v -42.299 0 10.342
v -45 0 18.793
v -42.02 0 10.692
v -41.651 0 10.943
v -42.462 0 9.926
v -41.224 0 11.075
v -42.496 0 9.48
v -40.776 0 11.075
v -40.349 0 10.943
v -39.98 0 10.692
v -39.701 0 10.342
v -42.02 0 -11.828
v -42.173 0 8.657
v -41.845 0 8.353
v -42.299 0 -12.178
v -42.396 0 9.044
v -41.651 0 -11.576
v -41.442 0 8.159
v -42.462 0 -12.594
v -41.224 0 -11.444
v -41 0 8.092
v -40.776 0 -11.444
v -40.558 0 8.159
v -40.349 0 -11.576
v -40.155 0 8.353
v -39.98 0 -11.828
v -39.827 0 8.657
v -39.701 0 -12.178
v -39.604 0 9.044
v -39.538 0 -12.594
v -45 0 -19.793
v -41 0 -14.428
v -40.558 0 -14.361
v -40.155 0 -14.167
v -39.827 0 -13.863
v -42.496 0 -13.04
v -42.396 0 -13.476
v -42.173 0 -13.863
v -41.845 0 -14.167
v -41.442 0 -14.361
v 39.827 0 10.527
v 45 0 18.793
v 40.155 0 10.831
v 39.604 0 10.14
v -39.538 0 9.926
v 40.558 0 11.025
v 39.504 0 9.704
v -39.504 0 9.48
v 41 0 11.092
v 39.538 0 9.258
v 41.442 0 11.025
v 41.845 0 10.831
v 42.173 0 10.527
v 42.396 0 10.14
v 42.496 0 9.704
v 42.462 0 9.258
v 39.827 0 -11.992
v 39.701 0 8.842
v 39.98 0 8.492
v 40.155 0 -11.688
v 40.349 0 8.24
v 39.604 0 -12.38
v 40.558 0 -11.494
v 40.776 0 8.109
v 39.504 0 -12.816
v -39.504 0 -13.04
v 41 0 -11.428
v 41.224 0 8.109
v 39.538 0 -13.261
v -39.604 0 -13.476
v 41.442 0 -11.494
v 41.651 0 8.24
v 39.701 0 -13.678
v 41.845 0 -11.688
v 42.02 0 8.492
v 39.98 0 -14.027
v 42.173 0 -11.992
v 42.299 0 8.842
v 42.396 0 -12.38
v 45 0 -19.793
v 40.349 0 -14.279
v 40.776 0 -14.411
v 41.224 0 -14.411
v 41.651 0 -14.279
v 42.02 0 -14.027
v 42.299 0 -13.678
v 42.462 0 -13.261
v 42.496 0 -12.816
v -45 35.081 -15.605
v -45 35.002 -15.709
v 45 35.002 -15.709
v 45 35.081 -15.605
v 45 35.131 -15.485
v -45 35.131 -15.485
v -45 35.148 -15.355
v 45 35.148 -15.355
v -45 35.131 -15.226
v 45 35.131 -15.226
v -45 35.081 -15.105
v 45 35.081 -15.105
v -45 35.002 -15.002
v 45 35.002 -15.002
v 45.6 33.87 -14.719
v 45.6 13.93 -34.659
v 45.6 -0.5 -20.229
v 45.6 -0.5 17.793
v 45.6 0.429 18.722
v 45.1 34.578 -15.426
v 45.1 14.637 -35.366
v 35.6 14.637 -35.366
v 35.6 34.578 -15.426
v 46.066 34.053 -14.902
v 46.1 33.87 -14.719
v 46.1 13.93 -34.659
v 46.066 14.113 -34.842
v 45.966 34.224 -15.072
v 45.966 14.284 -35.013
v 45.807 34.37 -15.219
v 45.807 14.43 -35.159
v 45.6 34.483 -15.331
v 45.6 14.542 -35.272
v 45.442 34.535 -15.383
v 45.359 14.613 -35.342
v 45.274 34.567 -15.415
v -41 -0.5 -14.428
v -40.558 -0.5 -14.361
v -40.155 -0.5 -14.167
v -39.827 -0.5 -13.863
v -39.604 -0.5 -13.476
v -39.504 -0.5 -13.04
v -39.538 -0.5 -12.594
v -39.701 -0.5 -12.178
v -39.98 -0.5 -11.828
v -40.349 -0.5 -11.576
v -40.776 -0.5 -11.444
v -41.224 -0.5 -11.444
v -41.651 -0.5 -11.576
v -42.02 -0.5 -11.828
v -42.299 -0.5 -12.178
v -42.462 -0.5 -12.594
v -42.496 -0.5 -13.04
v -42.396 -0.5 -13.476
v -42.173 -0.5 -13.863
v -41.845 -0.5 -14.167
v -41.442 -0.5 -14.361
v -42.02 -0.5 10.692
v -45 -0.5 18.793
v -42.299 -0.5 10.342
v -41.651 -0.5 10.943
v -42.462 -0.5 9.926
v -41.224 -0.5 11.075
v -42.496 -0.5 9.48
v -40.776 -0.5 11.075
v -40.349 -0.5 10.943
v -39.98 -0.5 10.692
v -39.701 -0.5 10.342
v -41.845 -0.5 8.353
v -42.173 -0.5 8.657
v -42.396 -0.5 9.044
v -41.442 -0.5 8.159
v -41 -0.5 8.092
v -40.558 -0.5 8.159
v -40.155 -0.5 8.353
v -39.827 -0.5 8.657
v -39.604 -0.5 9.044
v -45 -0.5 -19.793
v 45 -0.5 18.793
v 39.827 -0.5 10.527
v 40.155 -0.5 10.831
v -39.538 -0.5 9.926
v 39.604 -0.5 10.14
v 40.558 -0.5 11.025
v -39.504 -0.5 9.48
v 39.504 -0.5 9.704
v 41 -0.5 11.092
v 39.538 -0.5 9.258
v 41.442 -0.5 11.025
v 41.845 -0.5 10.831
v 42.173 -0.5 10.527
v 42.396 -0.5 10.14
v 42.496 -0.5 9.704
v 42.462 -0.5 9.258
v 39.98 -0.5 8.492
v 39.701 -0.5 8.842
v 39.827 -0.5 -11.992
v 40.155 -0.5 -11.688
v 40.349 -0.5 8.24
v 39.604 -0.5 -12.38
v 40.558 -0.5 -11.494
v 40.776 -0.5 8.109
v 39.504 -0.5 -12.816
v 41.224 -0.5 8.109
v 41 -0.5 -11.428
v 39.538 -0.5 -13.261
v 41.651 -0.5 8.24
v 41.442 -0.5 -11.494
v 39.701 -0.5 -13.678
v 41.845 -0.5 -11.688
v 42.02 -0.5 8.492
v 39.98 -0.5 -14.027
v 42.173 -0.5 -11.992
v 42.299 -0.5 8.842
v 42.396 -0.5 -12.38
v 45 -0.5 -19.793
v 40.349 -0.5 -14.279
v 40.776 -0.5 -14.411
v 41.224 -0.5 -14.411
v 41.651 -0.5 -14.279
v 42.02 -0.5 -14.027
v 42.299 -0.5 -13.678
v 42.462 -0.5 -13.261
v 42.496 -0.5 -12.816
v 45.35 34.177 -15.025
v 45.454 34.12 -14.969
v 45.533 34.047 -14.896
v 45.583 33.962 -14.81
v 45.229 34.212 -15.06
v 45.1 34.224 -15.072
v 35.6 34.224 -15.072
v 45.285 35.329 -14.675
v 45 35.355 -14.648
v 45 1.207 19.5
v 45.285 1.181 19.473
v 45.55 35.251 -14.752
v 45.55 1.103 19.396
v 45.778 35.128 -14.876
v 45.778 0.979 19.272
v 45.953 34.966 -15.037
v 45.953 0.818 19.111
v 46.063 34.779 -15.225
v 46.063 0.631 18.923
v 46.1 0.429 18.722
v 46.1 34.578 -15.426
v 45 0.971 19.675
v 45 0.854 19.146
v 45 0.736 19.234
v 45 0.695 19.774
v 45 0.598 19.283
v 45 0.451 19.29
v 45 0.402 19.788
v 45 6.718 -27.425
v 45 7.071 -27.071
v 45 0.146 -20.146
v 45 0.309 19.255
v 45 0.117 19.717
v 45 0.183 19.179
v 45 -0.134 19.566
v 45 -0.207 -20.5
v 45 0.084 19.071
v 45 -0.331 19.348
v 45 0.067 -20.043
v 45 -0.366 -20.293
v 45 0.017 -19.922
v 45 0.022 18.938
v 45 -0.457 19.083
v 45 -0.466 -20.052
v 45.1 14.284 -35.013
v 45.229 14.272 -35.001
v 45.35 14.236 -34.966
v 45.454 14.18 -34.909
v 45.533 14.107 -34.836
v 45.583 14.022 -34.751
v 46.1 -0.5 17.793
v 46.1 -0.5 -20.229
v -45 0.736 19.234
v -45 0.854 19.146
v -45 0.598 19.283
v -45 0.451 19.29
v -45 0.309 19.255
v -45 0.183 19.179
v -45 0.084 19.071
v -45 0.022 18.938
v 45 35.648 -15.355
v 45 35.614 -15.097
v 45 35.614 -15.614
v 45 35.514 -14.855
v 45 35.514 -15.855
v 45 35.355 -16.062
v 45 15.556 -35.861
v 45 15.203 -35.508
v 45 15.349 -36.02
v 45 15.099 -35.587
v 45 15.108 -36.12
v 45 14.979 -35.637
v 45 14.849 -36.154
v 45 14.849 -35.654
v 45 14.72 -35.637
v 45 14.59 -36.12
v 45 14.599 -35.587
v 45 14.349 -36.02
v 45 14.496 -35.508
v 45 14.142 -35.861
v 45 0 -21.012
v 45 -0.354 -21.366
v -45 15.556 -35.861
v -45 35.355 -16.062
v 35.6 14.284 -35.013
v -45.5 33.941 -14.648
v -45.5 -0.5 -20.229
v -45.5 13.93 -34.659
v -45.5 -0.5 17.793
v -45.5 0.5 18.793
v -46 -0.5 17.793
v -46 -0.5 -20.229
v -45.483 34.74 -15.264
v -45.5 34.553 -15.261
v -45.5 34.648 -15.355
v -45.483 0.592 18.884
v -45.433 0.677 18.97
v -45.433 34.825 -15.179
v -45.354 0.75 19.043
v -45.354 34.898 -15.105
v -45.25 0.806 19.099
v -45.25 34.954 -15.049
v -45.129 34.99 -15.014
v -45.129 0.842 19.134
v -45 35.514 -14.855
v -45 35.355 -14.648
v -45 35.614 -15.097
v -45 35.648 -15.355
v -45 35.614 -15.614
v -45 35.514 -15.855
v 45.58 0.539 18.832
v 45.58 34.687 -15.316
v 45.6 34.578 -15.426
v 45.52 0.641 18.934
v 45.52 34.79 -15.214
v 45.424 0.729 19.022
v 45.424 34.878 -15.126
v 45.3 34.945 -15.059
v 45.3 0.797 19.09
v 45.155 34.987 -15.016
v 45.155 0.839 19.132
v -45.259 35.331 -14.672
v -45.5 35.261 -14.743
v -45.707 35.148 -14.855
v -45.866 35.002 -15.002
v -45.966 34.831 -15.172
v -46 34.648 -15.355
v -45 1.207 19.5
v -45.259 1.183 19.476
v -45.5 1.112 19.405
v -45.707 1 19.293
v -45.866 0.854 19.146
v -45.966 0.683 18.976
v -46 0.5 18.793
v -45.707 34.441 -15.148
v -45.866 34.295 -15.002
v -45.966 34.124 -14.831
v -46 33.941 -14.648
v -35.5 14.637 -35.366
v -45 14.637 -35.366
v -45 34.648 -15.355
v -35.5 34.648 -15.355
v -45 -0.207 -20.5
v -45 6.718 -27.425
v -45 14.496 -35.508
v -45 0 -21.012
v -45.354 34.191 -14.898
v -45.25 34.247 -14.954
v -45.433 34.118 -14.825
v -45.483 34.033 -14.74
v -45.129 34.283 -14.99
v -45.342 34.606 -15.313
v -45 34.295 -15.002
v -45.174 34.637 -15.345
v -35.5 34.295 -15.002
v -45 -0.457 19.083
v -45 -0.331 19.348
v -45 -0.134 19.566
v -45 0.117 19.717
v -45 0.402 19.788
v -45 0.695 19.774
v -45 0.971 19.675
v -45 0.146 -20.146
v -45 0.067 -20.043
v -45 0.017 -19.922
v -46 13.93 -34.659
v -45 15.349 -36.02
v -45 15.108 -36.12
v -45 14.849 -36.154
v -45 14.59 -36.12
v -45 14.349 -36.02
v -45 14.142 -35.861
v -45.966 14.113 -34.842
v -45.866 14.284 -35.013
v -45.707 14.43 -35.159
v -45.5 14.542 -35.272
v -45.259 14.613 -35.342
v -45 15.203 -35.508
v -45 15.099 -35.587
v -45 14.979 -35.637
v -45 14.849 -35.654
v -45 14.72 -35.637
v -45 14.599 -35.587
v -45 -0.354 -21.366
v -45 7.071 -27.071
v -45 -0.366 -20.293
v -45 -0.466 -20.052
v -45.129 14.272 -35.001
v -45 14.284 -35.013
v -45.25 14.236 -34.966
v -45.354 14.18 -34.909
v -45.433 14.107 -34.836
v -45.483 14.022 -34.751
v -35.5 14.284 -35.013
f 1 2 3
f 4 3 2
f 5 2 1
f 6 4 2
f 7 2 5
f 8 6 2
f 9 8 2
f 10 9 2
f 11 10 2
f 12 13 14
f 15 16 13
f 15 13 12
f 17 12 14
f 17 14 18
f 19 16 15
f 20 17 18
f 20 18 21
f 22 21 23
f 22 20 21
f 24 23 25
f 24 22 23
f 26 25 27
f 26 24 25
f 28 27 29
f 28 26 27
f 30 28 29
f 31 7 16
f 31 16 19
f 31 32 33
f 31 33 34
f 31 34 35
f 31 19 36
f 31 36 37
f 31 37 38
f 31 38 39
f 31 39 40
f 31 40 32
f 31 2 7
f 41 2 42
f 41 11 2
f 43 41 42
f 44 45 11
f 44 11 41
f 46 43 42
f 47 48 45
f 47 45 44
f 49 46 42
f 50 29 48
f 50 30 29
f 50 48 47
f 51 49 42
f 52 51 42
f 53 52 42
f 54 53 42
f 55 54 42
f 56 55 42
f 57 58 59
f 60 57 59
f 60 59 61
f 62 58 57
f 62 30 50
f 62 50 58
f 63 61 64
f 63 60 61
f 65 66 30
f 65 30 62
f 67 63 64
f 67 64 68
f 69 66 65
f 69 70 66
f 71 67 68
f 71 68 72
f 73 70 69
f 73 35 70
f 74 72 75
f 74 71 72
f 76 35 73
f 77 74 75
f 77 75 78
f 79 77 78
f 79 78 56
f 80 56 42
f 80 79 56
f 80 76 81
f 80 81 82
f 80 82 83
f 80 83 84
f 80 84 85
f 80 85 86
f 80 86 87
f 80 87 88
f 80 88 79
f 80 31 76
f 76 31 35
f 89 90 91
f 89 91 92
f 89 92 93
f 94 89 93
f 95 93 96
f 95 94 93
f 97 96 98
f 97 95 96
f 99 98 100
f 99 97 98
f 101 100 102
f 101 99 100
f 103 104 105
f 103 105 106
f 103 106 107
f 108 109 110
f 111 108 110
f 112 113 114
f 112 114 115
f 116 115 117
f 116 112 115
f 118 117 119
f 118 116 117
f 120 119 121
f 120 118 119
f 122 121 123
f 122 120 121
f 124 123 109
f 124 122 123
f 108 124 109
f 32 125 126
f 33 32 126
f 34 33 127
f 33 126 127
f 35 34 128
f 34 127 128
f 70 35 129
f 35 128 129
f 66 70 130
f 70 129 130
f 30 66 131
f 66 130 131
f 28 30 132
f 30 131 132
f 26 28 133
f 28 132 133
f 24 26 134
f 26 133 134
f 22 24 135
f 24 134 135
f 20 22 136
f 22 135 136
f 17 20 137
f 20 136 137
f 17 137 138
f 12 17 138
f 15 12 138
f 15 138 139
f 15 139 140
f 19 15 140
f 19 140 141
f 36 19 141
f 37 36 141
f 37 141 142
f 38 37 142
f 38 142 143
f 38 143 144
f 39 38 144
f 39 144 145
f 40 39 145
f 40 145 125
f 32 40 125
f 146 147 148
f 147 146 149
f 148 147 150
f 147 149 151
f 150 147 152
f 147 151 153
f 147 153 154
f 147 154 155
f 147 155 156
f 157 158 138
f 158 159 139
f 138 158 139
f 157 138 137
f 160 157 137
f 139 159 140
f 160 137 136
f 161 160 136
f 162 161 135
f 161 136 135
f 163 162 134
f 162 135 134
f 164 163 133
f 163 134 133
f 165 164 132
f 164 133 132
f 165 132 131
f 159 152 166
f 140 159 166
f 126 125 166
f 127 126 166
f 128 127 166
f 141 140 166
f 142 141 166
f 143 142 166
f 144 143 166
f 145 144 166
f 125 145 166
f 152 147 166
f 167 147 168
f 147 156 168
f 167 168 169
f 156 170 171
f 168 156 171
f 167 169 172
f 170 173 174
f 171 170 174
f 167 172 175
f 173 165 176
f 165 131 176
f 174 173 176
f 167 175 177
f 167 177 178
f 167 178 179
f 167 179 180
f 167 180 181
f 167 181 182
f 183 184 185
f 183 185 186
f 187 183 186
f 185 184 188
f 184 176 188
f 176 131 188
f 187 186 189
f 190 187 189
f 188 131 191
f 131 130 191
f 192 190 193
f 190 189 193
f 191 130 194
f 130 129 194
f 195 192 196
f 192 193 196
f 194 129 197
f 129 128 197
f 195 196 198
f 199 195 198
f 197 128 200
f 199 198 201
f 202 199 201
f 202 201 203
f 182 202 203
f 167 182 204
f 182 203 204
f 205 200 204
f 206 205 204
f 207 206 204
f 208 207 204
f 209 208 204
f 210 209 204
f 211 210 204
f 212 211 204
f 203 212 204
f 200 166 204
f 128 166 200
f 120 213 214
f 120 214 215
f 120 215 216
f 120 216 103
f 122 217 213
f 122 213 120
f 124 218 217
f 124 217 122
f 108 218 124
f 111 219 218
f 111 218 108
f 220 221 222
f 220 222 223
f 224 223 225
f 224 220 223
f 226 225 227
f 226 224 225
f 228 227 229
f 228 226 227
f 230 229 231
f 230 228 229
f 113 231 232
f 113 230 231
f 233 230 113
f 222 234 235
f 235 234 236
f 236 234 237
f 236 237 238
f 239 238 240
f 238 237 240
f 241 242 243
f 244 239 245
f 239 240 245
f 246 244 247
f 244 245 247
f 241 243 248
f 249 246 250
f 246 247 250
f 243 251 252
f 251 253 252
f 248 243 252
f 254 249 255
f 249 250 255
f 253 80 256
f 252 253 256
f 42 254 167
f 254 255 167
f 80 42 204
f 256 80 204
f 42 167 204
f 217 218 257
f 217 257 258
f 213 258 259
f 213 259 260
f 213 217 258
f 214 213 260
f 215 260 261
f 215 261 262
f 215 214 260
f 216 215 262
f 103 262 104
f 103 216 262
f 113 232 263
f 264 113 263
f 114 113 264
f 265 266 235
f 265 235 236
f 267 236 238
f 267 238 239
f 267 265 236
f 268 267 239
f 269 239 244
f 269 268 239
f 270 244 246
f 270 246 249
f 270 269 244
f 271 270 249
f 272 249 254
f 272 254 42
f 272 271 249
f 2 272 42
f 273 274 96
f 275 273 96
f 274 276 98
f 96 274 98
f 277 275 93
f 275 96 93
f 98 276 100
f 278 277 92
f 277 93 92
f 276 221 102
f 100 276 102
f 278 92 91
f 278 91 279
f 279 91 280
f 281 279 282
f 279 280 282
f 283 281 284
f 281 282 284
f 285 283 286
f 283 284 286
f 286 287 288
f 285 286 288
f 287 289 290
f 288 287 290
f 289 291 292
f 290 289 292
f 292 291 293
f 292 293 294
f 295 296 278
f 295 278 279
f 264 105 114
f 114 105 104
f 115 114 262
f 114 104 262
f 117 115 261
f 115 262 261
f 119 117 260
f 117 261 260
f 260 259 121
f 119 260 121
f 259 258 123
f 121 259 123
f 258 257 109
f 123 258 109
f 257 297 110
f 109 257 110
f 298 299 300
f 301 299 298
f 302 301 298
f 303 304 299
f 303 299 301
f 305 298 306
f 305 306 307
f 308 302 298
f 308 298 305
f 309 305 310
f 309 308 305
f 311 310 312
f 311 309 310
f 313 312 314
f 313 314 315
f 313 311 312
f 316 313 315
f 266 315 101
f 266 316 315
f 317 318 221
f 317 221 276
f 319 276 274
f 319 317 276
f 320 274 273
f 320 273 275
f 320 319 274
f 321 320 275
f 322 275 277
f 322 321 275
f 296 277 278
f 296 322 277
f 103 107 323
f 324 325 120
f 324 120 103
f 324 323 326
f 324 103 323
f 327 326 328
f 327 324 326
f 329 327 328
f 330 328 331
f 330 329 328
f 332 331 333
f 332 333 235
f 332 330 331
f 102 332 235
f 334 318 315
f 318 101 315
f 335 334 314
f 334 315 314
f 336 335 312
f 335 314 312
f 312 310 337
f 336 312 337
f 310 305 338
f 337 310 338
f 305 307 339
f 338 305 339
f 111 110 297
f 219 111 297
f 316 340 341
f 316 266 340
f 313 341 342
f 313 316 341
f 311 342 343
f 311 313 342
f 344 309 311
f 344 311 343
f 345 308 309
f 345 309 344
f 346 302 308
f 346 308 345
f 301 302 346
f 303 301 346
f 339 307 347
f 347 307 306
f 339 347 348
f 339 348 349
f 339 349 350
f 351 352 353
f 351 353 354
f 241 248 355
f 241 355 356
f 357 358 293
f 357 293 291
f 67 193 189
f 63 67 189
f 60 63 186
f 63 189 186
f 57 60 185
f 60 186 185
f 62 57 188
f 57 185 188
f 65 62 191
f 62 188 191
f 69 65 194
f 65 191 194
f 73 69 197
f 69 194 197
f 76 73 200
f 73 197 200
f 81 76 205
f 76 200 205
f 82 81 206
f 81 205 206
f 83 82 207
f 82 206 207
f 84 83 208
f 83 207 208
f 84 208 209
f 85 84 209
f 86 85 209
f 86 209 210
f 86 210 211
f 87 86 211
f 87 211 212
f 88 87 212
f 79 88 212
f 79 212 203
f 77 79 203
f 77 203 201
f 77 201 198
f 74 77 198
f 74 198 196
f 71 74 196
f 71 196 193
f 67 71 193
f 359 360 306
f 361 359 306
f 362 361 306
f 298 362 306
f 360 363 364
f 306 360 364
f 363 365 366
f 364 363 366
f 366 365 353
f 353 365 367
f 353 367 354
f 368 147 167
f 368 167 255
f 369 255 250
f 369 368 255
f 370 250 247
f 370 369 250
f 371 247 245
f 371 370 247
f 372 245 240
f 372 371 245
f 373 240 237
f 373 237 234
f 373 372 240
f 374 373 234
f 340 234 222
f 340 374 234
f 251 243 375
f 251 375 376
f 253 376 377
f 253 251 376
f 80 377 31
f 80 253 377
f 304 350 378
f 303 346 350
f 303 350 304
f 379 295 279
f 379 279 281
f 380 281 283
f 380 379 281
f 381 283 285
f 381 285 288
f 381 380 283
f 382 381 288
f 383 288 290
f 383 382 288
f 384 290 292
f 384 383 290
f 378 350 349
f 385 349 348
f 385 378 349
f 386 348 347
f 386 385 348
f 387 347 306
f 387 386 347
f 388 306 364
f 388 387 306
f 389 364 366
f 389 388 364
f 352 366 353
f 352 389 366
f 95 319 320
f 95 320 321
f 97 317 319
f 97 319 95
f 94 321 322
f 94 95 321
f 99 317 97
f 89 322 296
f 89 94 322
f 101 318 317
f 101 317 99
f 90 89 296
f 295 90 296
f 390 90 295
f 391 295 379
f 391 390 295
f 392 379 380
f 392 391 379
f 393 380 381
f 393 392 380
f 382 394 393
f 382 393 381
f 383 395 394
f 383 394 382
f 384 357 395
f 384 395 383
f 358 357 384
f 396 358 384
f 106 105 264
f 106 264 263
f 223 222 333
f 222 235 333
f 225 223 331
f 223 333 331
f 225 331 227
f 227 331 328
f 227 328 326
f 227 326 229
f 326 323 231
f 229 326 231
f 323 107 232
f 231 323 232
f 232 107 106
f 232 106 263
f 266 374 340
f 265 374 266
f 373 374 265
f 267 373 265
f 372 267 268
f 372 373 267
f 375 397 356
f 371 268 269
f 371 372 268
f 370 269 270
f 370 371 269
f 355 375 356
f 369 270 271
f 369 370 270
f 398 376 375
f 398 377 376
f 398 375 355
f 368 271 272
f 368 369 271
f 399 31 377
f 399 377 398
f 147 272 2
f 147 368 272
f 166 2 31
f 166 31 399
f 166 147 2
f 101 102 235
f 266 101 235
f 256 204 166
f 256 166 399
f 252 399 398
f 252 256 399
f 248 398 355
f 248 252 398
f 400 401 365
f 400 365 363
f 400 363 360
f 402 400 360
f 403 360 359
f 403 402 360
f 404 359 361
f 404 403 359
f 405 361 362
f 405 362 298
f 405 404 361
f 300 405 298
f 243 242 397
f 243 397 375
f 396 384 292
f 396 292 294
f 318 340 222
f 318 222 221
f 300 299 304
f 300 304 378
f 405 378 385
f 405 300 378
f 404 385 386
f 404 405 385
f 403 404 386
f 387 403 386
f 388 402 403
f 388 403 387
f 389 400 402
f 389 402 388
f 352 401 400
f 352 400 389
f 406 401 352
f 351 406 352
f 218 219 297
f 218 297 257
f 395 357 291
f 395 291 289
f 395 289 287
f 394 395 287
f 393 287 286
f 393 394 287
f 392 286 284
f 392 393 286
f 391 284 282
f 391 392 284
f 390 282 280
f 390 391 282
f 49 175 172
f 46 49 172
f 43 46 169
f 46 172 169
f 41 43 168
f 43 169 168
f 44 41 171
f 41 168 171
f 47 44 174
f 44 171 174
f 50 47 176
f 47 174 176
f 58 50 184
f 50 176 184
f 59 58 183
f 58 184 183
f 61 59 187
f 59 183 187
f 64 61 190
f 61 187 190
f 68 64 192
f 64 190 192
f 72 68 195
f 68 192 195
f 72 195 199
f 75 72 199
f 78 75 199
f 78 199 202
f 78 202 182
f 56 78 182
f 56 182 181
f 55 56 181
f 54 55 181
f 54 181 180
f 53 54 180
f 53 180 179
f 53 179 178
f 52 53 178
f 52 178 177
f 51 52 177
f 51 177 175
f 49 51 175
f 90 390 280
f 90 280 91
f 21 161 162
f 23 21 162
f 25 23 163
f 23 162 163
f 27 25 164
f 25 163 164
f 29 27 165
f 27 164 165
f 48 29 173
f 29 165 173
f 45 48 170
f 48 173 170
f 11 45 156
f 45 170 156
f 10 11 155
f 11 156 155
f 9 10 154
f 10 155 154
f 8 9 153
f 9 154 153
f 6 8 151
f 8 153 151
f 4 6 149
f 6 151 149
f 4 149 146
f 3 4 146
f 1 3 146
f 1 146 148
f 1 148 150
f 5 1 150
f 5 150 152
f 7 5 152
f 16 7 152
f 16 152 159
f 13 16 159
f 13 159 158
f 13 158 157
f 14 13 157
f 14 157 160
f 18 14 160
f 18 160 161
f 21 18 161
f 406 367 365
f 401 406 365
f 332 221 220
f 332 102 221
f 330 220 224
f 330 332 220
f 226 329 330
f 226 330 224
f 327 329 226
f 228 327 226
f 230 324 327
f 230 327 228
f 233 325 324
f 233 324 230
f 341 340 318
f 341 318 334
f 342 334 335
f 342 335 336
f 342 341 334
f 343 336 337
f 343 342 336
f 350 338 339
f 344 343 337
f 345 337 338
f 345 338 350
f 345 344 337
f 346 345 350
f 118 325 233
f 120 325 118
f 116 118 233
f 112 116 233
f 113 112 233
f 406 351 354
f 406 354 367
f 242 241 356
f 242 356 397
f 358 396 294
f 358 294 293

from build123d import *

# Parameters (mm, degrees)
SKETCH1_W                     = 90
SKETCH1_H                     = 40
BASE_FLANGE1_DEPTH            = 0.5
EDGE_FLANGE1_STRIP_CUT_DEPTH  = 90
EDGE_FLANGE1_DEPTH            = 90
EDGE_FLANGE3_STRIP_CUT_DEPTH  = 90
EDGE_FLANGE3_DEPTH            = 90
EDGE_FLANGE2_STRIP_W          = 3
EDGE_FLANGE2_STRIP_H          = 0.5
EDGE_FLANGE2_STRIP_CUT_DEPTH  = 90
EDGE_FLANGE2_DEPTH            = 90
EDGE_FLANGE5_STRIP_W          = 3
EDGE_FLANGE5_STRIP_H          = 0.5
EDGE_FLANGE5_STRIP_CUT_DEPTH  = 90
EDGE_FLANGE5_DEPTH            = 90
EDGE_FLANGE7_DEPTH            = 48.292893219
EDGE_FLANGE8_DEPTH            = 48.292893219
CUT_EXTRUDE3_DEPTH            = 106.168160415
EDGE_FLANGE9_STRIP_W          = 3
EDGE_FLANGE9_STRIP_H          = 0.5
EDGE_FLANGE9_STRIP_CUT_DEPTH  = 28.3
EDGE_FLANGE9_DEPTH            = 28.3
EDGE_FLANGE10_STRIP_W         = 3
EDGE_FLANGE10_STRIP_H         = 0.5
EDGE_FLANGE10_STRIP_CUT_DEPTH = 28.2
EDGE_FLANGE10_DEPTH           = 28.2
SKETCH65_R                    = 1.5
CUT_EXTRUDE4_DEPTH            = 5


# Sheet-metal steps are written as plain solids
with BuildPart() as part:
    # Sketch1 → Base-Flange1 (new body)
    with BuildSketch(Plane(origin=(0, 0, 0), x_dir=(1, 0, 0), z_dir=(0, 1, 0))):
        Rectangle(SKETCH1_W, SKETCH1_H)
    extrude(amount=-BASE_FLANGE1_DEPTH)

    # Edge-Flange1 strip (across the edge) → Edge-Flange1 strip cut (cut)
    with BuildSketch(Plane(origin=(-45, 0, 20), x_dir=(0, -0.7071067811865513, -0.7071067811865438), z_dir=(1, 0, 0))):
        Polygon((-3.914213562, -4.621320344), (1.207106781, 0.5), (0.853553391, 0.853553391), (-4.267766953, -4.267766953), align=None)
    extrude(amount=EDGE_FLANGE1_STRIP_CUT_DEPTH, mode=Mode.SUBTRACT)

    # Edge-Flange1 section (across the edge) → Edge-Flange1 (add)
    with BuildSketch(Plane(origin=(-45, 0, 20), x_dir=(0, -0.7071067811865513, -0.7071067811865438), z_dir=(1, 0, 0))):
        with BuildLine():
            Line((-0.5, 1.207106781), (-0.5, 50))
            Line((-0.5, 50), (0, 50))
            Line((0, 50), (0, 1.207106781))
            ThreePointArc((0, 1.207106781), (0.308658284, 0.745167015), (0.853553391, 0.853553391))
            Line((0.853553391, 0.853553391), (1.207106781, 0.5))
            ThreePointArc((1.207106781, 0.5), (0.117316568, 0.283227249), (-0.5, 1.207106781))
        make_face()
    extrude(amount=EDGE_FLANGE1_DEPTH)

    # Edge-Flange3 strip (across the edge) → Edge-Flange3 strip cut (cut)
    with BuildSketch(Plane(origin=(45, 0, -20), x_dir=(0, 0.7071067811865562, 0.7071067811865388), z_dir=(-1, 0, 0))):
        Polygon((-2.328427125, 1.621320344), (-0.207106781, -0.5), (0.146446609, -0.146446609), (-1.974873734, 1.974873734), align=None)
    extrude(amount=EDGE_FLANGE3_STRIP_CUT_DEPTH, mode=Mode.SUBTRACT)

    # Edge-Flange3 section (across the edge) → Edge-Flange3 (add)
    with BuildSketch(Plane(origin=(45, 0, -20), x_dir=(0, 0.7071067811865562, 0.7071067811865388), z_dir=(-1, 0, 0))):
        with BuildLine():
            Line((-0.5, 0.207106781), (-0.5, 10))
            Line((-0.5, 10), (0, 10))
            Line((0, 10), (0, 0.207106781))
            ThreePointArc((0, 0.207106781), (0.038060234, 0.015765065), (0.146446609, -0.146446609))
            Line((0.146446609, -0.146446609), (-0.207106781, -0.5))
            ThreePointArc((-0.207106781, -0.5), (-0.423879533, -0.175576651), (-0.5, 0.207106781))
        make_face()
    extrude(amount=EDGE_FLANGE3_DEPTH)

    # Edge-Flange2 strip (across the edge) → Edge-Flange2 strip cut (cut)
    with BuildSketch(Plane(origin=(-45, 35.355339059, -15.355339059), x_dir=(0, -0.7071067811865511, 0.7071067811865439), z_dir=(1, 0, 0))):
        with Locations((-1, -0.25)):
            Rectangle(EDGE_FLANGE2_STRIP_W, EDGE_FLANGE2_STRIP_H)
    extrude(amount=EDGE_FLANGE2_STRIP_CUT_DEPTH, mode=Mode.SUBTRACT)

    # Edge-Flange2 section (across the edge) → Edge-Flange2 (add)
    with BuildSketch(Plane(origin=(-45, 35.355339059, -15.355339059), x_dir=(0, -0.7071067811865511, 0.7071067811865439), z_dir=(1, 0, 0))):
        with BuildLine():
            Line((-0.5, 0.5), (-0.5, 29))
            Line((-0.5, 29), (0, 29))
            Line((0, 29), (0, 0.5))
            ThreePointArc((0, 0.5), (0.146446609, 0.146446609), (0.5, 0))
            Line((0.5, 0), (0.5, -0.5))
            ThreePointArc((0.5, -0.5), (-0.207106781, -0.207106781), (-0.5, 0.5))
        make_face()
    extrude(amount=EDGE_FLANGE2_DEPTH)

    # Edge-Flange5 strip (across the edge) → Edge-Flange5 strip cut (cut)
    with BuildSketch(Plane(origin=(-45, 14.849242405, -35.861435714), x_dir=(0, 0.7071067811865416, 0.7071067811865535), z_dir=(1, 0, 0))):
        with Locations((-1, -0.25)):
            Rectangle(EDGE_FLANGE5_STRIP_W, EDGE_FLANGE5_STRIP_H)
    extrude(amount=EDGE_FLANGE5_STRIP_CUT_DEPTH, mode=Mode.SUBTRACT)

    # Edge-Flange5 section (across the edge) → Edge-Flange5 (add)
    with BuildSketch(Plane(origin=(-45, 14.849242405, -35.861435714), x_dir=(0, 0.7071067811865416, 0.7071067811865535), z_dir=(1, 0, 0))):
        with BuildLine():
            Line((-0.5, 0.5), (-0.5, 21))
            Line((-0.5, 21), (0, 21))
            Line((0, 21), (0, 0.5))
            ThreePointArc((0, 0.5), (0.146446609, 0.146446609), (0.5, 0))
            Line((0.5, 0), (0.5, -0.5))
            ThreePointArc((0.5, -0.5), (-0.207106781, -0.207106781), (-0.5, 0.5))
        make_face()
    extrude(amount=EDGE_FLANGE5_DEPTH)

    # Edge-Flange7 section (across the edge) → Edge-Flange7 (add)
    with BuildSketch(Plane(origin=(-45.5, 0.853553391, 19.146446609), x_dir=(1, 0, 0), z_dir=(0, 0.707106781186544, -0.7071067811865512))):
        with BuildLine():
            Line((-0.5, 0.5), (-0.5, 28.8))
            Line((-0.5, 28.8), (0, 28.8))
            Line((0, 28.8), (0, 0.5))
            ThreePointArc((0, 0.5), (0.146446609, 0.146446609), (0.5, 0))
            Line((0.5, 0), (0.5, -0.5))
            ThreePointArc((0.5, -0.5), (-0.207106781, -0.207106781), (-0.5, 0.5))
        make_face()
    extrude(amount=EDGE_FLANGE7_DEPTH)

    # Edge-Flange8 section (across the edge) → Edge-Flange8 (add)
    with BuildSketch(Plane(origin=(45.6, 35.001785669, -15.001785669), x_dir=(-1, 0, 0), z_dir=(0, -0.7071067811865439, 0.7071067811865512))):
        with BuildLine():
            Line((-0.5, 0.6), (-0.5, 28.8))
            Line((-0.5, 28.8), (0, 28.8))
            Line((0, 28.8), (0, 0.6))
            ThreePointArc((0, 0.6), (0.175735931, 0.175735931), (0.6, 0))
            Line((0.6, 0), (0.6, -0.5))
            ThreePointArc((0.6, -0.5), (-0.177817459, -0.177817459), (-0.5, 0.6))
        make_face()
    extrude(amount=EDGE_FLANGE8_DEPTH)

    # Sketch52 → Cut-Extrude3 (cut, through all)
    with BuildSketch(Plane.ZY.offset(46)):
        Polygon((-20.229350596, -0.5), (17.792893219, -0.5), (-1.218228689, -19.511121908), align=None)
    extrude(amount=-CUT_EXTRUDE3_DEPTH, mode=Mode.SUBTRACT)

    # Edge-Flange9 strip (across the edge) → Edge-Flange9 strip cut (cut)
    with BuildSketch(Plane(origin=(-45.5, 14.637110371, -35.366460967), x_dir=(3.347797797820495e-15, -0.7071067811865438, 0.7071067811865515), z_dir=(0, 0.7071067811865515, 0.7071067811865438))):
        with Locations((-0.5, -0.25)):
            Rectangle(EDGE_FLANGE9_STRIP_W, EDGE_FLANGE9_STRIP_H)
    extrude(amount=EDGE_FLANGE9_STRIP_CUT_DEPTH, mode=Mode.SUBTRACT)

    # Edge-Flange9 section (across the edge) → Edge-Flange9 (add)
    with BuildSketch(Plane(origin=(-45.5, 14.637110371, -35.366460967), x_dir=(3.347797797820495e-15, -0.7071067811865438, 0.7071067811865515), z_dir=(0, 0.7071067811865515, 0.7071067811865438))):
        with BuildLine():
            Line((0, 0.5), (0, 10))
            Line((0, 10), (0.5, 10))
            Line((0.5, 10), (0.5, 0.5))
            ThreePointArc((0.5, 0.5), (0.646446609, 0.146446609), (1, 0))
            Line((1, 0), (1, -0.5))
            ThreePointArc((1, -0.5), (0.292893219, -0.207106781), (0, 0.5))
        make_face()
    extrude(amount=EDGE_FLANGE9_DEPTH)

    # Edge-Flange10 strip (across the edge) → Edge-Flange10 strip cut (cut)
    with BuildSketch(Plane(origin=(45.6, 34.5775216, -15.426049737), x_dir=(-3.491481338843137e-15, -0.7071067811865434, 0.7071067811865518), z_dir=(3.4448409452021724e-15, -0.7071067811865518, -0.7071067811865434))):
        with Locations((-0.5, -0.25)):
            Rectangle(EDGE_FLANGE10_STRIP_W, EDGE_FLANGE10_STRIP_H)
    extrude(amount=EDGE_FLANGE10_STRIP_CUT_DEPTH, mode=Mode.SUBTRACT)

    # Edge-Flange10 section (across the edge) → Edge-Flange10 (add)
    with BuildSketch(Plane(origin=(45.6, 34.5775216, -15.426049737), x_dir=(-3.491481338843137e-15, -0.7071067811865434, 0.7071067811865518), z_dir=(3.4448409452021724e-15, -0.7071067811865518, -0.7071067811865434))):
        with BuildLine():
            Line((0, 0.5), (0, 10))
            Line((0, 10), (0.5, 10))
            Line((0.5, 10), (0.5, 0.5))
            ThreePointArc((0.5, 0.5), (0.646446609, 0.146446609), (1, 0))
            Line((1, 0), (1, -0.5))
            ThreePointArc((1, -0.5), (0.292893219, -0.207106781), (0, 0.5))
        make_face()
    extrude(amount=EDGE_FLANGE10_DEPTH)

    # Sketch65 → Cut-Extrude4 (cut)
    with BuildSketch(Plane.XZ.offset(0.5)):
        with Locations(Location((-41, 9.591937881, 0), (0, 0, 270))):
            Circle(SKETCH65_R)
        with Locations(Location((41, 9.591937881, 0), (0, 0, 90))):
            Circle(SKETCH65_R)
        with Locations(Location((-41, -12.92766953, 0), (0, 0, 270))):
            Circle(SKETCH65_R)
        with Locations(Location((41, -12.92766953, 0), (0, 0, 90))):
            Circle(SKETCH65_R)
    extrude(amount=-CUT_EXTRUDE4_DEPTH, mode=Mode.SUBTRACT)


solid = part.part
